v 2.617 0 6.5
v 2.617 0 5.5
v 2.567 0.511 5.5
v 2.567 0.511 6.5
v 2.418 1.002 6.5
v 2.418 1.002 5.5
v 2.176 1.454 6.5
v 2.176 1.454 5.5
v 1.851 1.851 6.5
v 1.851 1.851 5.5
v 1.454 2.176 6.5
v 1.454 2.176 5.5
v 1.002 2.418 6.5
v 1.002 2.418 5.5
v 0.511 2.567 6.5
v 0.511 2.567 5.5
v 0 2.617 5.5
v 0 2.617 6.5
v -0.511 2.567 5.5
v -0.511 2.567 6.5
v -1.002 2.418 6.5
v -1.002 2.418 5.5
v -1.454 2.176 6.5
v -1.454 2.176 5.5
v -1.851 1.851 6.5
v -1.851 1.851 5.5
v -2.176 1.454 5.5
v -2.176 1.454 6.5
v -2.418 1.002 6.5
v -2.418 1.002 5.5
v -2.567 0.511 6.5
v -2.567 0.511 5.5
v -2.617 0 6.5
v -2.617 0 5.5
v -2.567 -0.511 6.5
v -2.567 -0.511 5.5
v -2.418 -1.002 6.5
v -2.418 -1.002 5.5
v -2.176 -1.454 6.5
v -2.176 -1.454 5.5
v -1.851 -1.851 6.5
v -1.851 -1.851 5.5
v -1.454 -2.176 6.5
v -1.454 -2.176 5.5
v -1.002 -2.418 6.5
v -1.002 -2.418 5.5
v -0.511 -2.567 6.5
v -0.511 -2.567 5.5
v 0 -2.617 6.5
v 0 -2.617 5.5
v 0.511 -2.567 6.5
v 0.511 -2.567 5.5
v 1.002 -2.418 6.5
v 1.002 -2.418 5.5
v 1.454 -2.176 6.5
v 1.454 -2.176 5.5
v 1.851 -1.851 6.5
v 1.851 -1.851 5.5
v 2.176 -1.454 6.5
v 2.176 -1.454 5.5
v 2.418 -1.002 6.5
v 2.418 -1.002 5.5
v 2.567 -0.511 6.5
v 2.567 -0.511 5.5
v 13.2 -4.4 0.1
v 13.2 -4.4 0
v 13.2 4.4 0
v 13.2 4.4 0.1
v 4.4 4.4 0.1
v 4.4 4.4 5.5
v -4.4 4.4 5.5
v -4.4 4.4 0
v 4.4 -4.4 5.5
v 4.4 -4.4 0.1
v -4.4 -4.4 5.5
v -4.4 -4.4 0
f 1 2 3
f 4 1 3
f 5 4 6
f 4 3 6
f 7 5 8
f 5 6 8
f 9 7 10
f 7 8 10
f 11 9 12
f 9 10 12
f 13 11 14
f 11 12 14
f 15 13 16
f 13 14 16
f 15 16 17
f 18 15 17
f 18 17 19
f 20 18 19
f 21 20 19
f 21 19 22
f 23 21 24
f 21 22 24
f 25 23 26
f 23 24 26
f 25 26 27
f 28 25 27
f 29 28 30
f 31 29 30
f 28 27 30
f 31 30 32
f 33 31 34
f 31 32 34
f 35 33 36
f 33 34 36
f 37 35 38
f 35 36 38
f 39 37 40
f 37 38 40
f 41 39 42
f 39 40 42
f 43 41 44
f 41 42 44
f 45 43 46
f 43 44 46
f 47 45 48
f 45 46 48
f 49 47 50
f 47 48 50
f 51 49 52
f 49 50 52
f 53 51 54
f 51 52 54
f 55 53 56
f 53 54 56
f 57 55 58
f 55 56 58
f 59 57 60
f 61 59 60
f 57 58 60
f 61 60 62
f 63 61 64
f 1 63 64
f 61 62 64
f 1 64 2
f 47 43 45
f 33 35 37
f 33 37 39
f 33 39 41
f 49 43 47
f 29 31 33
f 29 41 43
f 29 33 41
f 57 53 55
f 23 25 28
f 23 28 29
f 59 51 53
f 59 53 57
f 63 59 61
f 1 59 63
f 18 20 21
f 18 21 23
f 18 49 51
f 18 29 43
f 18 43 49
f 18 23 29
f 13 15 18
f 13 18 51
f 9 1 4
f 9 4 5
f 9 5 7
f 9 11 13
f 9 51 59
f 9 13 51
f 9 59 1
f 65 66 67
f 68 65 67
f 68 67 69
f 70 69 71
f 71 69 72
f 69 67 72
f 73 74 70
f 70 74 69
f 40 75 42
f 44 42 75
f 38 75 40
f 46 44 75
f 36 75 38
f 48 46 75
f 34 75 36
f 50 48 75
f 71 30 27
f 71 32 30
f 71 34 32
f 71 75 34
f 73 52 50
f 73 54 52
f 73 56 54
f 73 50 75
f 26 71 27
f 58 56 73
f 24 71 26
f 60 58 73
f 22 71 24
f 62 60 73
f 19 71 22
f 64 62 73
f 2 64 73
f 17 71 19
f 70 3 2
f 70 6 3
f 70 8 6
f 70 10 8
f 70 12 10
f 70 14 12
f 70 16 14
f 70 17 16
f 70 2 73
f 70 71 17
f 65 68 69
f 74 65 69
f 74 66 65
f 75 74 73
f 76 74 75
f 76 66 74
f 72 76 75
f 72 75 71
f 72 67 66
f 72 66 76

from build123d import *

# Parameters (mm, degrees)
SKETCH1_W           = 8.8
SKETCH1_H           = 8.8
BOSS_EXTRUDE1_DEPTH = 5.5
SKETCH2_W           = 17.6
SKETCH2_H           = 8.8
BOSS_EXTRUDE2_DEPTH = 0.1
SKETCH3_R           = 2.617377511
BOSS_EXTRUDE3_DEPTH = 1


with BuildPart() as part:
    # Sketch1 → Boss-Extrude1 (new body)
    with BuildSketch(Plane.XY):
        Rectangle(SKETCH1_W, SKETCH1_H)
    extrude(amount=BOSS_EXTRUDE1_DEPTH)

    # Sketch2 → Boss-Extrude2 (add)
    with BuildSketch(Plane(origin=(0, 0, 0), x_dir=(-1, 0, 0), z_dir=(0, 0, -1))):
        with Locations((-4.4, 0)):
            Rectangle(SKETCH2_W, SKETCH2_H)
    extrude(amount=-BOSS_EXTRUDE2_DEPTH)

    # Sketch3 → Boss-Extrude3 (add)
    with BuildSketch(Plane.XY.offset(5.5)):
        Circle(SKETCH3_R)
    extrude(amount=BOSS_EXTRUDE3_DEPTH)


solid = part.part
